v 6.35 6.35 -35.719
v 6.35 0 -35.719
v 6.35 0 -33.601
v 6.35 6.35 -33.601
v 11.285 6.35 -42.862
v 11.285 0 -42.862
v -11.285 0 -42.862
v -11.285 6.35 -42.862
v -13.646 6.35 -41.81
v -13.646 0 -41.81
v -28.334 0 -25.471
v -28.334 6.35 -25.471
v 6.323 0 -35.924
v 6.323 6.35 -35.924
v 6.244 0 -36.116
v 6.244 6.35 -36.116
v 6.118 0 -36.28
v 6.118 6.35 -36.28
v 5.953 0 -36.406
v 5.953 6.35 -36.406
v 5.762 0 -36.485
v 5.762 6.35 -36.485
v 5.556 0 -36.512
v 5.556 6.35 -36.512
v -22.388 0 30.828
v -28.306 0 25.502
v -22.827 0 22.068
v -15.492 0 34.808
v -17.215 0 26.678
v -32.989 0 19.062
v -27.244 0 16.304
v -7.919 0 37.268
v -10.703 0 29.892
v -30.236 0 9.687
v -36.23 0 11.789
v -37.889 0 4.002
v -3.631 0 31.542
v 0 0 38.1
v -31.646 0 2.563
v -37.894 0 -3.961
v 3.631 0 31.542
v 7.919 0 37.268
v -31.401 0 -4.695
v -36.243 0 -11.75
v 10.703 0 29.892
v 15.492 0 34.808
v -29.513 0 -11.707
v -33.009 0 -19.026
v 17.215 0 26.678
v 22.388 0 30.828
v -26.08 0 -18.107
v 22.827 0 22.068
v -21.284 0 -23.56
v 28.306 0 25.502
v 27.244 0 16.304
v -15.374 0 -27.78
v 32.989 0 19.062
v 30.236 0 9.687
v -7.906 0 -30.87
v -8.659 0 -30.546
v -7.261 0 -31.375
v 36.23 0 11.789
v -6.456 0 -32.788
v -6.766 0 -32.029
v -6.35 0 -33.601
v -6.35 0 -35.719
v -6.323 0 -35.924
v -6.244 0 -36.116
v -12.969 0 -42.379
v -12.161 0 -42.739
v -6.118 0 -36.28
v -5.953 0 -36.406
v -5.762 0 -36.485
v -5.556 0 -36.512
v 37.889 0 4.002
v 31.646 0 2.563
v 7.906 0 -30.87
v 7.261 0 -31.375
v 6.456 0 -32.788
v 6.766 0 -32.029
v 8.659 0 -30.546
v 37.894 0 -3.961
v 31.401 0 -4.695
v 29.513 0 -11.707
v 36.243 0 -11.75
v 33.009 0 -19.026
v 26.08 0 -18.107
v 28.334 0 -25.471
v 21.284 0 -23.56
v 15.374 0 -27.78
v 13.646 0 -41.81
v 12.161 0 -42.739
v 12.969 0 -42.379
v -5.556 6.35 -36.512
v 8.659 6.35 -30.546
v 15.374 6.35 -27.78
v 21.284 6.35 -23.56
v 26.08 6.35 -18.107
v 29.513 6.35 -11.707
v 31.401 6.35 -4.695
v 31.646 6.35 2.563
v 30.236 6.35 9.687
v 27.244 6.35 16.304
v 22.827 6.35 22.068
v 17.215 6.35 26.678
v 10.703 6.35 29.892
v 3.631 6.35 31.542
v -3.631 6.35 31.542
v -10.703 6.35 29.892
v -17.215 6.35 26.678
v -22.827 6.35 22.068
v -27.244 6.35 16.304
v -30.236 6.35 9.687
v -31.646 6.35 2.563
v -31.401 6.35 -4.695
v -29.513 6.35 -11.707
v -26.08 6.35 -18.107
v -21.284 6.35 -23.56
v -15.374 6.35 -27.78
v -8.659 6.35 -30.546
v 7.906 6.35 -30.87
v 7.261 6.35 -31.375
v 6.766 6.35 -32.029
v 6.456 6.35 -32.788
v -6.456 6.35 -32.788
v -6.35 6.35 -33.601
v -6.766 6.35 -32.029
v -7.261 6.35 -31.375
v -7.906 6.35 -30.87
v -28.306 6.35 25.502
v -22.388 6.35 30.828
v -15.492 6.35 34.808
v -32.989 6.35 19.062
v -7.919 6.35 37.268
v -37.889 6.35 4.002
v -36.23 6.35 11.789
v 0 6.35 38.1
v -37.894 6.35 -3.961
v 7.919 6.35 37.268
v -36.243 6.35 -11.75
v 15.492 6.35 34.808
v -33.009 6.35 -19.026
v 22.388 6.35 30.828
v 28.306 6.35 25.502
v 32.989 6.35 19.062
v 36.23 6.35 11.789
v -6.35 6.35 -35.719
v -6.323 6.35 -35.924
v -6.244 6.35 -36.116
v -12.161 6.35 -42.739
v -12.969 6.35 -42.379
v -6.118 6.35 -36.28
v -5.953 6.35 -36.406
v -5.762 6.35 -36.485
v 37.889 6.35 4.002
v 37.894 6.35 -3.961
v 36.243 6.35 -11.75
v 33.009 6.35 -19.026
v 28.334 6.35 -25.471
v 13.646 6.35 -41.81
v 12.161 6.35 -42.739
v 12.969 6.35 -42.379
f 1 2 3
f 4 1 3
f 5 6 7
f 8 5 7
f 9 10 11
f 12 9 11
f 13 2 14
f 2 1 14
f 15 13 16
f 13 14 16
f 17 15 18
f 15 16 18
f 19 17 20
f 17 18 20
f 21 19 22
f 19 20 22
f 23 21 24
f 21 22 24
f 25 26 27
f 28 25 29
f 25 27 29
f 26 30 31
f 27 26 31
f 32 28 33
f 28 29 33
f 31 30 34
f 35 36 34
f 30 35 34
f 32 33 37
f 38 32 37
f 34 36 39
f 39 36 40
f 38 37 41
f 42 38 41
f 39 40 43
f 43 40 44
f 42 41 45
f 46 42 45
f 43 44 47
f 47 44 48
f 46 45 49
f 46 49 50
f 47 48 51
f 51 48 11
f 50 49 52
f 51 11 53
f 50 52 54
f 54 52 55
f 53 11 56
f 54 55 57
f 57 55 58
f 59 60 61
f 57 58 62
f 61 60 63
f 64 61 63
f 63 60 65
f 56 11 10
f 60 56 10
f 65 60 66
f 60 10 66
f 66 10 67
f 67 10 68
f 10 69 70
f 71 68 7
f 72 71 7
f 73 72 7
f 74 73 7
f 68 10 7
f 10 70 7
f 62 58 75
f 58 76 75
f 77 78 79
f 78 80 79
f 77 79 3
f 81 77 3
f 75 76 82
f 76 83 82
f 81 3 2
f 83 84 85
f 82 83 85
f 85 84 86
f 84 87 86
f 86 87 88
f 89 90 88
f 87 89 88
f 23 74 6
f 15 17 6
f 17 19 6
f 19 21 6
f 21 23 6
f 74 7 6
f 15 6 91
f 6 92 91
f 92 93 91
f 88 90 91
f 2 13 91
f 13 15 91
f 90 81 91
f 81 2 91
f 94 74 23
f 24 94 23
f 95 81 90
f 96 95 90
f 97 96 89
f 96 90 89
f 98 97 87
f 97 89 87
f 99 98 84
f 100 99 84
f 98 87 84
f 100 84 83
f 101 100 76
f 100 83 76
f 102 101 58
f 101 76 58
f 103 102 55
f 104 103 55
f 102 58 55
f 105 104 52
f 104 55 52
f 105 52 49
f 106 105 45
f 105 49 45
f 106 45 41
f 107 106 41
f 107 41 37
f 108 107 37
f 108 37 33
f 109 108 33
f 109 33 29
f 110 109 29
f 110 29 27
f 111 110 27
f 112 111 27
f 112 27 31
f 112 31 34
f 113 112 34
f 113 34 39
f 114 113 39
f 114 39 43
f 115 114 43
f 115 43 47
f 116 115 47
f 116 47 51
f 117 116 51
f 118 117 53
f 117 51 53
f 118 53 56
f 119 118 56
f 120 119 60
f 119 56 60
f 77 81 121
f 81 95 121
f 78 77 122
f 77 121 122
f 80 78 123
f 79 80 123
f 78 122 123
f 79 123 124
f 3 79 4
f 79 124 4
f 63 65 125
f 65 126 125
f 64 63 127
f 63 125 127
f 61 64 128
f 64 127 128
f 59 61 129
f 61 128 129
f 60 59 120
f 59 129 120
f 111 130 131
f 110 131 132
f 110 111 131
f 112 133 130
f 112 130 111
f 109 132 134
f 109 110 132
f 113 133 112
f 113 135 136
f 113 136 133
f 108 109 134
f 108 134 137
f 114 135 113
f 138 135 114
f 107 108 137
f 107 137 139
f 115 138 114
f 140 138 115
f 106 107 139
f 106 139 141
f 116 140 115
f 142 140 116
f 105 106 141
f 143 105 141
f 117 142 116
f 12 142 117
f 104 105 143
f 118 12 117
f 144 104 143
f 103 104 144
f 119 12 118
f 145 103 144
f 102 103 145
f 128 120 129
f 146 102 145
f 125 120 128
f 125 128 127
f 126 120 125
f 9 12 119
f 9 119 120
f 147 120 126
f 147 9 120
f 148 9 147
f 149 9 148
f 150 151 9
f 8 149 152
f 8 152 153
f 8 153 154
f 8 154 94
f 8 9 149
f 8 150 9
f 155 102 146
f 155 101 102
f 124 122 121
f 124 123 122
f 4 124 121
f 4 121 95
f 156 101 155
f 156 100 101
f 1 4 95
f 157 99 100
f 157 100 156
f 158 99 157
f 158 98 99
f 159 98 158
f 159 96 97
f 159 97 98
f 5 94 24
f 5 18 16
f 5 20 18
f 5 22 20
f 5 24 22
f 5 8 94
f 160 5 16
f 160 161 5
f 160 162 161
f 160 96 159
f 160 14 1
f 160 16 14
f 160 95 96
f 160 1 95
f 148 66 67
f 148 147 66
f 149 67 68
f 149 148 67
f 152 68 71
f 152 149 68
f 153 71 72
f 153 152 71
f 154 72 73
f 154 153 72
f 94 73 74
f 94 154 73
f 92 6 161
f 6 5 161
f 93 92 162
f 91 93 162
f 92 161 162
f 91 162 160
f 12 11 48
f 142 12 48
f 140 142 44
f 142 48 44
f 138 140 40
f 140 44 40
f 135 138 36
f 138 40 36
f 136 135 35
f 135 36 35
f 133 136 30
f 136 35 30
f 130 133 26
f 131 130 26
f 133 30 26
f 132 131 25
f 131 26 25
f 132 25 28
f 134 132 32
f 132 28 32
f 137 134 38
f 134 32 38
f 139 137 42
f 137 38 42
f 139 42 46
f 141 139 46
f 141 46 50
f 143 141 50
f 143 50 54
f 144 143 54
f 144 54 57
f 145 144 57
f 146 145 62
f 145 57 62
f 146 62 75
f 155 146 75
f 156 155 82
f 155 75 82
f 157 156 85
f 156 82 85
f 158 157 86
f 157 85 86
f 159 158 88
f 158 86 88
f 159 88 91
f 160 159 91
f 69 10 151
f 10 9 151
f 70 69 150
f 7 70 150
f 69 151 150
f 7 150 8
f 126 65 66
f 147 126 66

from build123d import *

# Parameters (mm, degrees)
BOSS_EXTRUDE1_DEPTH = 6.35
FILLET1_R           = 0.79375
FILLET3_R           = 3.175


with BuildPart() as part:
    # Sketch1 → Boss-Extrude1 (new body)
    with BuildSketch(Plane(origin=(0, 0, 0), x_dir=(1, 0, 0), z_dir=(0, 1, 0))):
        with BuildLine():
            Line((-12.7, 42.8625), (-28.334044467, 25.471394232))
            ThreePointArc((-28.334044467, 25.471394232), (0, -38.1), (28.334044467, 25.471394232))
            Line((28.334044467, 25.471394232), (12.7, 42.8625))
            Line((12.7, 42.8625), (-12.7, 42.8625))
        make_face()
        with BuildLine():
            Line((-6.35, 36.5125), (6.35, 36.5125))
            Line((6.35, 36.5125), (6.35, 31.108519733))
            ThreePointArc((6.35, 31.108519733), (0, -31.75), (-6.35, 31.108519733))
            Line((-6.35, 31.108519733), (-6.35, 36.5125))
        make_face(mode=Mode.SUBTRACT)
    extrude(amount=BOSS_EXTRUDE1_DEPTH)

    # Fillet1
    fillet1_edges = [part.edges().sort_by_distance(p)[0] for p in [
        (-6.35, 3.175, -36.5125),
        (6.35, 3.175, -36.5125),
    ]]
    fillet(fillet1_edges, radius=FILLET1_R)

    # Fillet3
    fillet3_edges = [part.edges().sort_by_distance(p)[0] for p in [
        (-6.35, 3.175, -31.108519733),
        (6.35, 3.175, -31.108519733),
        (-12.7, 3.175, -42.8625),
        (12.7, 3.175, -42.8625),
    ]]
    fillet(fillet3_edges, radius=FILLET3_R)


solid = part.part
